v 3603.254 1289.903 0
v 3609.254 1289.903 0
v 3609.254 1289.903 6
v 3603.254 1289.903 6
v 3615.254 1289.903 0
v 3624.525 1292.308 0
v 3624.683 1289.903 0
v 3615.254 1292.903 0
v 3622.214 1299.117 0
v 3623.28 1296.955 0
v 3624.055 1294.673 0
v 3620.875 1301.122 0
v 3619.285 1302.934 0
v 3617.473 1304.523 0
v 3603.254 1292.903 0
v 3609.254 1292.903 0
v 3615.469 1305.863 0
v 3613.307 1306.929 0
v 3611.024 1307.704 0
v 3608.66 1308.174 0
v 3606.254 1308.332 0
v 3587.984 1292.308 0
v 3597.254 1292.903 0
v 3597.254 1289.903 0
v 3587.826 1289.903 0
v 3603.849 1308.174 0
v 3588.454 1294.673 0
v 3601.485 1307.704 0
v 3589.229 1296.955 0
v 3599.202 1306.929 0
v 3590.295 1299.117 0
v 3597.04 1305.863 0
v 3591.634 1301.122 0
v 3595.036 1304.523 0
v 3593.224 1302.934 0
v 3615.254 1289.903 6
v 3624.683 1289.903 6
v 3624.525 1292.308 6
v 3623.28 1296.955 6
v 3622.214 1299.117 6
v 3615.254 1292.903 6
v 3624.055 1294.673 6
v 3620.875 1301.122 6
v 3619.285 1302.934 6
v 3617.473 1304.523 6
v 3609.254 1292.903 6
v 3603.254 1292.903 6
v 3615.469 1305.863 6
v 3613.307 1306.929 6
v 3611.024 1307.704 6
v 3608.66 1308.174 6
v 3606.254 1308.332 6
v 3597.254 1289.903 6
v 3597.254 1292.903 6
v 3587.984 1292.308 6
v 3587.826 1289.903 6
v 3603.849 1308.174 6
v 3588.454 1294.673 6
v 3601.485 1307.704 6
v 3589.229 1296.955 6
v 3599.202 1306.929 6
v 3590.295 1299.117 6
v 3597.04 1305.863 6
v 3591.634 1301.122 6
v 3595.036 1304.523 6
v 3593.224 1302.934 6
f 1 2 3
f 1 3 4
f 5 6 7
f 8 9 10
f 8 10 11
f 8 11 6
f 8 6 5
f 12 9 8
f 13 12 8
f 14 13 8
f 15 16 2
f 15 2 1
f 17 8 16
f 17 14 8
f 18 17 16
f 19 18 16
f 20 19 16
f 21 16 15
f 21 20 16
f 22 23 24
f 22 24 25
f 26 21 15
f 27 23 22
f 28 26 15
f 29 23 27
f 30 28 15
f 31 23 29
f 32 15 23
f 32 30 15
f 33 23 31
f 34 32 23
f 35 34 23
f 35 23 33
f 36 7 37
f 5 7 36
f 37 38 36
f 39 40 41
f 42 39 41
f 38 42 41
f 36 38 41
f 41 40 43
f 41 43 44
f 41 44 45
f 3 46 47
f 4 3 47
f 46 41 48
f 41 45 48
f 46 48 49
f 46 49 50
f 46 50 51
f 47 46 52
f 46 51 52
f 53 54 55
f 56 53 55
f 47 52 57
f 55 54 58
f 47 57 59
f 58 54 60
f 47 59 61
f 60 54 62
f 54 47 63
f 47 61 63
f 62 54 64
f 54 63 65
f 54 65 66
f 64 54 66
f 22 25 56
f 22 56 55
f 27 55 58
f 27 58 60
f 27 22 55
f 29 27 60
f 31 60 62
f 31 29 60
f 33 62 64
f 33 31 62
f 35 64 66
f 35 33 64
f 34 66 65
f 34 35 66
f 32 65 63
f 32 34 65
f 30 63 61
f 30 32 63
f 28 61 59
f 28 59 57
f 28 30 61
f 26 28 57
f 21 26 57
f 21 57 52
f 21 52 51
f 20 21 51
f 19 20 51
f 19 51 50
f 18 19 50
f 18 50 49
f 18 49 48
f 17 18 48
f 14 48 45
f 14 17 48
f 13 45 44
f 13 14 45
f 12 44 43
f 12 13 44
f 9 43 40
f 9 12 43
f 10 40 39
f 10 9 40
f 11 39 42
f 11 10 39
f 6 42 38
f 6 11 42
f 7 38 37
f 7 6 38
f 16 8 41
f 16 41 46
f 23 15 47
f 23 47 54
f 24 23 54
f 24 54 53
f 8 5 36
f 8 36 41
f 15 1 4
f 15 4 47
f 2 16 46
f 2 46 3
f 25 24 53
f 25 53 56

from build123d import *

# Parameters (mm, degrees)
BOSS_EXTRUDE1_DEPTH = 6


with BuildPart() as part:
    # Model → Boss-Extrude1 (new body)
    with BuildSketch(Plane.XY):
        with BuildLine():
            Line((3624.683047417, 1289.903027574), (3615.254475988, 1289.903027574))
            Line((3615.254475988, 1289.903027574), (3615.254475988, 1292.903027574))
            Line((3615.254475988, 1292.903027574), (3609.254475988, 1292.903027574))
            Line((3609.254475988, 1292.903027574), (3609.254475988, 1289.903027574))
            Line((3609.254475988, 1289.903027574), (3603.254475988, 1289.903027574))
            Line((3603.254475988, 1289.903027574), (3603.254475988, 1292.903027574))
            Line((3603.254475988, 1292.903027574), (3597.254475988, 1292.903027574))
            Line((3597.254475988, 1292.903027574), (3597.254475988, 1289.903027574))
            Line((3597.254475988, 1289.903027574), (3587.82590456, 1289.903027574))
            ThreePointArc((3587.82590456, 1289.903027574), (3606.254475988, 1308.331599003), (3624.683047417, 1289.903027574))
        make_face()
    extrude(amount=BOSS_EXTRUDE1_DEPTH)


solid = part.part
